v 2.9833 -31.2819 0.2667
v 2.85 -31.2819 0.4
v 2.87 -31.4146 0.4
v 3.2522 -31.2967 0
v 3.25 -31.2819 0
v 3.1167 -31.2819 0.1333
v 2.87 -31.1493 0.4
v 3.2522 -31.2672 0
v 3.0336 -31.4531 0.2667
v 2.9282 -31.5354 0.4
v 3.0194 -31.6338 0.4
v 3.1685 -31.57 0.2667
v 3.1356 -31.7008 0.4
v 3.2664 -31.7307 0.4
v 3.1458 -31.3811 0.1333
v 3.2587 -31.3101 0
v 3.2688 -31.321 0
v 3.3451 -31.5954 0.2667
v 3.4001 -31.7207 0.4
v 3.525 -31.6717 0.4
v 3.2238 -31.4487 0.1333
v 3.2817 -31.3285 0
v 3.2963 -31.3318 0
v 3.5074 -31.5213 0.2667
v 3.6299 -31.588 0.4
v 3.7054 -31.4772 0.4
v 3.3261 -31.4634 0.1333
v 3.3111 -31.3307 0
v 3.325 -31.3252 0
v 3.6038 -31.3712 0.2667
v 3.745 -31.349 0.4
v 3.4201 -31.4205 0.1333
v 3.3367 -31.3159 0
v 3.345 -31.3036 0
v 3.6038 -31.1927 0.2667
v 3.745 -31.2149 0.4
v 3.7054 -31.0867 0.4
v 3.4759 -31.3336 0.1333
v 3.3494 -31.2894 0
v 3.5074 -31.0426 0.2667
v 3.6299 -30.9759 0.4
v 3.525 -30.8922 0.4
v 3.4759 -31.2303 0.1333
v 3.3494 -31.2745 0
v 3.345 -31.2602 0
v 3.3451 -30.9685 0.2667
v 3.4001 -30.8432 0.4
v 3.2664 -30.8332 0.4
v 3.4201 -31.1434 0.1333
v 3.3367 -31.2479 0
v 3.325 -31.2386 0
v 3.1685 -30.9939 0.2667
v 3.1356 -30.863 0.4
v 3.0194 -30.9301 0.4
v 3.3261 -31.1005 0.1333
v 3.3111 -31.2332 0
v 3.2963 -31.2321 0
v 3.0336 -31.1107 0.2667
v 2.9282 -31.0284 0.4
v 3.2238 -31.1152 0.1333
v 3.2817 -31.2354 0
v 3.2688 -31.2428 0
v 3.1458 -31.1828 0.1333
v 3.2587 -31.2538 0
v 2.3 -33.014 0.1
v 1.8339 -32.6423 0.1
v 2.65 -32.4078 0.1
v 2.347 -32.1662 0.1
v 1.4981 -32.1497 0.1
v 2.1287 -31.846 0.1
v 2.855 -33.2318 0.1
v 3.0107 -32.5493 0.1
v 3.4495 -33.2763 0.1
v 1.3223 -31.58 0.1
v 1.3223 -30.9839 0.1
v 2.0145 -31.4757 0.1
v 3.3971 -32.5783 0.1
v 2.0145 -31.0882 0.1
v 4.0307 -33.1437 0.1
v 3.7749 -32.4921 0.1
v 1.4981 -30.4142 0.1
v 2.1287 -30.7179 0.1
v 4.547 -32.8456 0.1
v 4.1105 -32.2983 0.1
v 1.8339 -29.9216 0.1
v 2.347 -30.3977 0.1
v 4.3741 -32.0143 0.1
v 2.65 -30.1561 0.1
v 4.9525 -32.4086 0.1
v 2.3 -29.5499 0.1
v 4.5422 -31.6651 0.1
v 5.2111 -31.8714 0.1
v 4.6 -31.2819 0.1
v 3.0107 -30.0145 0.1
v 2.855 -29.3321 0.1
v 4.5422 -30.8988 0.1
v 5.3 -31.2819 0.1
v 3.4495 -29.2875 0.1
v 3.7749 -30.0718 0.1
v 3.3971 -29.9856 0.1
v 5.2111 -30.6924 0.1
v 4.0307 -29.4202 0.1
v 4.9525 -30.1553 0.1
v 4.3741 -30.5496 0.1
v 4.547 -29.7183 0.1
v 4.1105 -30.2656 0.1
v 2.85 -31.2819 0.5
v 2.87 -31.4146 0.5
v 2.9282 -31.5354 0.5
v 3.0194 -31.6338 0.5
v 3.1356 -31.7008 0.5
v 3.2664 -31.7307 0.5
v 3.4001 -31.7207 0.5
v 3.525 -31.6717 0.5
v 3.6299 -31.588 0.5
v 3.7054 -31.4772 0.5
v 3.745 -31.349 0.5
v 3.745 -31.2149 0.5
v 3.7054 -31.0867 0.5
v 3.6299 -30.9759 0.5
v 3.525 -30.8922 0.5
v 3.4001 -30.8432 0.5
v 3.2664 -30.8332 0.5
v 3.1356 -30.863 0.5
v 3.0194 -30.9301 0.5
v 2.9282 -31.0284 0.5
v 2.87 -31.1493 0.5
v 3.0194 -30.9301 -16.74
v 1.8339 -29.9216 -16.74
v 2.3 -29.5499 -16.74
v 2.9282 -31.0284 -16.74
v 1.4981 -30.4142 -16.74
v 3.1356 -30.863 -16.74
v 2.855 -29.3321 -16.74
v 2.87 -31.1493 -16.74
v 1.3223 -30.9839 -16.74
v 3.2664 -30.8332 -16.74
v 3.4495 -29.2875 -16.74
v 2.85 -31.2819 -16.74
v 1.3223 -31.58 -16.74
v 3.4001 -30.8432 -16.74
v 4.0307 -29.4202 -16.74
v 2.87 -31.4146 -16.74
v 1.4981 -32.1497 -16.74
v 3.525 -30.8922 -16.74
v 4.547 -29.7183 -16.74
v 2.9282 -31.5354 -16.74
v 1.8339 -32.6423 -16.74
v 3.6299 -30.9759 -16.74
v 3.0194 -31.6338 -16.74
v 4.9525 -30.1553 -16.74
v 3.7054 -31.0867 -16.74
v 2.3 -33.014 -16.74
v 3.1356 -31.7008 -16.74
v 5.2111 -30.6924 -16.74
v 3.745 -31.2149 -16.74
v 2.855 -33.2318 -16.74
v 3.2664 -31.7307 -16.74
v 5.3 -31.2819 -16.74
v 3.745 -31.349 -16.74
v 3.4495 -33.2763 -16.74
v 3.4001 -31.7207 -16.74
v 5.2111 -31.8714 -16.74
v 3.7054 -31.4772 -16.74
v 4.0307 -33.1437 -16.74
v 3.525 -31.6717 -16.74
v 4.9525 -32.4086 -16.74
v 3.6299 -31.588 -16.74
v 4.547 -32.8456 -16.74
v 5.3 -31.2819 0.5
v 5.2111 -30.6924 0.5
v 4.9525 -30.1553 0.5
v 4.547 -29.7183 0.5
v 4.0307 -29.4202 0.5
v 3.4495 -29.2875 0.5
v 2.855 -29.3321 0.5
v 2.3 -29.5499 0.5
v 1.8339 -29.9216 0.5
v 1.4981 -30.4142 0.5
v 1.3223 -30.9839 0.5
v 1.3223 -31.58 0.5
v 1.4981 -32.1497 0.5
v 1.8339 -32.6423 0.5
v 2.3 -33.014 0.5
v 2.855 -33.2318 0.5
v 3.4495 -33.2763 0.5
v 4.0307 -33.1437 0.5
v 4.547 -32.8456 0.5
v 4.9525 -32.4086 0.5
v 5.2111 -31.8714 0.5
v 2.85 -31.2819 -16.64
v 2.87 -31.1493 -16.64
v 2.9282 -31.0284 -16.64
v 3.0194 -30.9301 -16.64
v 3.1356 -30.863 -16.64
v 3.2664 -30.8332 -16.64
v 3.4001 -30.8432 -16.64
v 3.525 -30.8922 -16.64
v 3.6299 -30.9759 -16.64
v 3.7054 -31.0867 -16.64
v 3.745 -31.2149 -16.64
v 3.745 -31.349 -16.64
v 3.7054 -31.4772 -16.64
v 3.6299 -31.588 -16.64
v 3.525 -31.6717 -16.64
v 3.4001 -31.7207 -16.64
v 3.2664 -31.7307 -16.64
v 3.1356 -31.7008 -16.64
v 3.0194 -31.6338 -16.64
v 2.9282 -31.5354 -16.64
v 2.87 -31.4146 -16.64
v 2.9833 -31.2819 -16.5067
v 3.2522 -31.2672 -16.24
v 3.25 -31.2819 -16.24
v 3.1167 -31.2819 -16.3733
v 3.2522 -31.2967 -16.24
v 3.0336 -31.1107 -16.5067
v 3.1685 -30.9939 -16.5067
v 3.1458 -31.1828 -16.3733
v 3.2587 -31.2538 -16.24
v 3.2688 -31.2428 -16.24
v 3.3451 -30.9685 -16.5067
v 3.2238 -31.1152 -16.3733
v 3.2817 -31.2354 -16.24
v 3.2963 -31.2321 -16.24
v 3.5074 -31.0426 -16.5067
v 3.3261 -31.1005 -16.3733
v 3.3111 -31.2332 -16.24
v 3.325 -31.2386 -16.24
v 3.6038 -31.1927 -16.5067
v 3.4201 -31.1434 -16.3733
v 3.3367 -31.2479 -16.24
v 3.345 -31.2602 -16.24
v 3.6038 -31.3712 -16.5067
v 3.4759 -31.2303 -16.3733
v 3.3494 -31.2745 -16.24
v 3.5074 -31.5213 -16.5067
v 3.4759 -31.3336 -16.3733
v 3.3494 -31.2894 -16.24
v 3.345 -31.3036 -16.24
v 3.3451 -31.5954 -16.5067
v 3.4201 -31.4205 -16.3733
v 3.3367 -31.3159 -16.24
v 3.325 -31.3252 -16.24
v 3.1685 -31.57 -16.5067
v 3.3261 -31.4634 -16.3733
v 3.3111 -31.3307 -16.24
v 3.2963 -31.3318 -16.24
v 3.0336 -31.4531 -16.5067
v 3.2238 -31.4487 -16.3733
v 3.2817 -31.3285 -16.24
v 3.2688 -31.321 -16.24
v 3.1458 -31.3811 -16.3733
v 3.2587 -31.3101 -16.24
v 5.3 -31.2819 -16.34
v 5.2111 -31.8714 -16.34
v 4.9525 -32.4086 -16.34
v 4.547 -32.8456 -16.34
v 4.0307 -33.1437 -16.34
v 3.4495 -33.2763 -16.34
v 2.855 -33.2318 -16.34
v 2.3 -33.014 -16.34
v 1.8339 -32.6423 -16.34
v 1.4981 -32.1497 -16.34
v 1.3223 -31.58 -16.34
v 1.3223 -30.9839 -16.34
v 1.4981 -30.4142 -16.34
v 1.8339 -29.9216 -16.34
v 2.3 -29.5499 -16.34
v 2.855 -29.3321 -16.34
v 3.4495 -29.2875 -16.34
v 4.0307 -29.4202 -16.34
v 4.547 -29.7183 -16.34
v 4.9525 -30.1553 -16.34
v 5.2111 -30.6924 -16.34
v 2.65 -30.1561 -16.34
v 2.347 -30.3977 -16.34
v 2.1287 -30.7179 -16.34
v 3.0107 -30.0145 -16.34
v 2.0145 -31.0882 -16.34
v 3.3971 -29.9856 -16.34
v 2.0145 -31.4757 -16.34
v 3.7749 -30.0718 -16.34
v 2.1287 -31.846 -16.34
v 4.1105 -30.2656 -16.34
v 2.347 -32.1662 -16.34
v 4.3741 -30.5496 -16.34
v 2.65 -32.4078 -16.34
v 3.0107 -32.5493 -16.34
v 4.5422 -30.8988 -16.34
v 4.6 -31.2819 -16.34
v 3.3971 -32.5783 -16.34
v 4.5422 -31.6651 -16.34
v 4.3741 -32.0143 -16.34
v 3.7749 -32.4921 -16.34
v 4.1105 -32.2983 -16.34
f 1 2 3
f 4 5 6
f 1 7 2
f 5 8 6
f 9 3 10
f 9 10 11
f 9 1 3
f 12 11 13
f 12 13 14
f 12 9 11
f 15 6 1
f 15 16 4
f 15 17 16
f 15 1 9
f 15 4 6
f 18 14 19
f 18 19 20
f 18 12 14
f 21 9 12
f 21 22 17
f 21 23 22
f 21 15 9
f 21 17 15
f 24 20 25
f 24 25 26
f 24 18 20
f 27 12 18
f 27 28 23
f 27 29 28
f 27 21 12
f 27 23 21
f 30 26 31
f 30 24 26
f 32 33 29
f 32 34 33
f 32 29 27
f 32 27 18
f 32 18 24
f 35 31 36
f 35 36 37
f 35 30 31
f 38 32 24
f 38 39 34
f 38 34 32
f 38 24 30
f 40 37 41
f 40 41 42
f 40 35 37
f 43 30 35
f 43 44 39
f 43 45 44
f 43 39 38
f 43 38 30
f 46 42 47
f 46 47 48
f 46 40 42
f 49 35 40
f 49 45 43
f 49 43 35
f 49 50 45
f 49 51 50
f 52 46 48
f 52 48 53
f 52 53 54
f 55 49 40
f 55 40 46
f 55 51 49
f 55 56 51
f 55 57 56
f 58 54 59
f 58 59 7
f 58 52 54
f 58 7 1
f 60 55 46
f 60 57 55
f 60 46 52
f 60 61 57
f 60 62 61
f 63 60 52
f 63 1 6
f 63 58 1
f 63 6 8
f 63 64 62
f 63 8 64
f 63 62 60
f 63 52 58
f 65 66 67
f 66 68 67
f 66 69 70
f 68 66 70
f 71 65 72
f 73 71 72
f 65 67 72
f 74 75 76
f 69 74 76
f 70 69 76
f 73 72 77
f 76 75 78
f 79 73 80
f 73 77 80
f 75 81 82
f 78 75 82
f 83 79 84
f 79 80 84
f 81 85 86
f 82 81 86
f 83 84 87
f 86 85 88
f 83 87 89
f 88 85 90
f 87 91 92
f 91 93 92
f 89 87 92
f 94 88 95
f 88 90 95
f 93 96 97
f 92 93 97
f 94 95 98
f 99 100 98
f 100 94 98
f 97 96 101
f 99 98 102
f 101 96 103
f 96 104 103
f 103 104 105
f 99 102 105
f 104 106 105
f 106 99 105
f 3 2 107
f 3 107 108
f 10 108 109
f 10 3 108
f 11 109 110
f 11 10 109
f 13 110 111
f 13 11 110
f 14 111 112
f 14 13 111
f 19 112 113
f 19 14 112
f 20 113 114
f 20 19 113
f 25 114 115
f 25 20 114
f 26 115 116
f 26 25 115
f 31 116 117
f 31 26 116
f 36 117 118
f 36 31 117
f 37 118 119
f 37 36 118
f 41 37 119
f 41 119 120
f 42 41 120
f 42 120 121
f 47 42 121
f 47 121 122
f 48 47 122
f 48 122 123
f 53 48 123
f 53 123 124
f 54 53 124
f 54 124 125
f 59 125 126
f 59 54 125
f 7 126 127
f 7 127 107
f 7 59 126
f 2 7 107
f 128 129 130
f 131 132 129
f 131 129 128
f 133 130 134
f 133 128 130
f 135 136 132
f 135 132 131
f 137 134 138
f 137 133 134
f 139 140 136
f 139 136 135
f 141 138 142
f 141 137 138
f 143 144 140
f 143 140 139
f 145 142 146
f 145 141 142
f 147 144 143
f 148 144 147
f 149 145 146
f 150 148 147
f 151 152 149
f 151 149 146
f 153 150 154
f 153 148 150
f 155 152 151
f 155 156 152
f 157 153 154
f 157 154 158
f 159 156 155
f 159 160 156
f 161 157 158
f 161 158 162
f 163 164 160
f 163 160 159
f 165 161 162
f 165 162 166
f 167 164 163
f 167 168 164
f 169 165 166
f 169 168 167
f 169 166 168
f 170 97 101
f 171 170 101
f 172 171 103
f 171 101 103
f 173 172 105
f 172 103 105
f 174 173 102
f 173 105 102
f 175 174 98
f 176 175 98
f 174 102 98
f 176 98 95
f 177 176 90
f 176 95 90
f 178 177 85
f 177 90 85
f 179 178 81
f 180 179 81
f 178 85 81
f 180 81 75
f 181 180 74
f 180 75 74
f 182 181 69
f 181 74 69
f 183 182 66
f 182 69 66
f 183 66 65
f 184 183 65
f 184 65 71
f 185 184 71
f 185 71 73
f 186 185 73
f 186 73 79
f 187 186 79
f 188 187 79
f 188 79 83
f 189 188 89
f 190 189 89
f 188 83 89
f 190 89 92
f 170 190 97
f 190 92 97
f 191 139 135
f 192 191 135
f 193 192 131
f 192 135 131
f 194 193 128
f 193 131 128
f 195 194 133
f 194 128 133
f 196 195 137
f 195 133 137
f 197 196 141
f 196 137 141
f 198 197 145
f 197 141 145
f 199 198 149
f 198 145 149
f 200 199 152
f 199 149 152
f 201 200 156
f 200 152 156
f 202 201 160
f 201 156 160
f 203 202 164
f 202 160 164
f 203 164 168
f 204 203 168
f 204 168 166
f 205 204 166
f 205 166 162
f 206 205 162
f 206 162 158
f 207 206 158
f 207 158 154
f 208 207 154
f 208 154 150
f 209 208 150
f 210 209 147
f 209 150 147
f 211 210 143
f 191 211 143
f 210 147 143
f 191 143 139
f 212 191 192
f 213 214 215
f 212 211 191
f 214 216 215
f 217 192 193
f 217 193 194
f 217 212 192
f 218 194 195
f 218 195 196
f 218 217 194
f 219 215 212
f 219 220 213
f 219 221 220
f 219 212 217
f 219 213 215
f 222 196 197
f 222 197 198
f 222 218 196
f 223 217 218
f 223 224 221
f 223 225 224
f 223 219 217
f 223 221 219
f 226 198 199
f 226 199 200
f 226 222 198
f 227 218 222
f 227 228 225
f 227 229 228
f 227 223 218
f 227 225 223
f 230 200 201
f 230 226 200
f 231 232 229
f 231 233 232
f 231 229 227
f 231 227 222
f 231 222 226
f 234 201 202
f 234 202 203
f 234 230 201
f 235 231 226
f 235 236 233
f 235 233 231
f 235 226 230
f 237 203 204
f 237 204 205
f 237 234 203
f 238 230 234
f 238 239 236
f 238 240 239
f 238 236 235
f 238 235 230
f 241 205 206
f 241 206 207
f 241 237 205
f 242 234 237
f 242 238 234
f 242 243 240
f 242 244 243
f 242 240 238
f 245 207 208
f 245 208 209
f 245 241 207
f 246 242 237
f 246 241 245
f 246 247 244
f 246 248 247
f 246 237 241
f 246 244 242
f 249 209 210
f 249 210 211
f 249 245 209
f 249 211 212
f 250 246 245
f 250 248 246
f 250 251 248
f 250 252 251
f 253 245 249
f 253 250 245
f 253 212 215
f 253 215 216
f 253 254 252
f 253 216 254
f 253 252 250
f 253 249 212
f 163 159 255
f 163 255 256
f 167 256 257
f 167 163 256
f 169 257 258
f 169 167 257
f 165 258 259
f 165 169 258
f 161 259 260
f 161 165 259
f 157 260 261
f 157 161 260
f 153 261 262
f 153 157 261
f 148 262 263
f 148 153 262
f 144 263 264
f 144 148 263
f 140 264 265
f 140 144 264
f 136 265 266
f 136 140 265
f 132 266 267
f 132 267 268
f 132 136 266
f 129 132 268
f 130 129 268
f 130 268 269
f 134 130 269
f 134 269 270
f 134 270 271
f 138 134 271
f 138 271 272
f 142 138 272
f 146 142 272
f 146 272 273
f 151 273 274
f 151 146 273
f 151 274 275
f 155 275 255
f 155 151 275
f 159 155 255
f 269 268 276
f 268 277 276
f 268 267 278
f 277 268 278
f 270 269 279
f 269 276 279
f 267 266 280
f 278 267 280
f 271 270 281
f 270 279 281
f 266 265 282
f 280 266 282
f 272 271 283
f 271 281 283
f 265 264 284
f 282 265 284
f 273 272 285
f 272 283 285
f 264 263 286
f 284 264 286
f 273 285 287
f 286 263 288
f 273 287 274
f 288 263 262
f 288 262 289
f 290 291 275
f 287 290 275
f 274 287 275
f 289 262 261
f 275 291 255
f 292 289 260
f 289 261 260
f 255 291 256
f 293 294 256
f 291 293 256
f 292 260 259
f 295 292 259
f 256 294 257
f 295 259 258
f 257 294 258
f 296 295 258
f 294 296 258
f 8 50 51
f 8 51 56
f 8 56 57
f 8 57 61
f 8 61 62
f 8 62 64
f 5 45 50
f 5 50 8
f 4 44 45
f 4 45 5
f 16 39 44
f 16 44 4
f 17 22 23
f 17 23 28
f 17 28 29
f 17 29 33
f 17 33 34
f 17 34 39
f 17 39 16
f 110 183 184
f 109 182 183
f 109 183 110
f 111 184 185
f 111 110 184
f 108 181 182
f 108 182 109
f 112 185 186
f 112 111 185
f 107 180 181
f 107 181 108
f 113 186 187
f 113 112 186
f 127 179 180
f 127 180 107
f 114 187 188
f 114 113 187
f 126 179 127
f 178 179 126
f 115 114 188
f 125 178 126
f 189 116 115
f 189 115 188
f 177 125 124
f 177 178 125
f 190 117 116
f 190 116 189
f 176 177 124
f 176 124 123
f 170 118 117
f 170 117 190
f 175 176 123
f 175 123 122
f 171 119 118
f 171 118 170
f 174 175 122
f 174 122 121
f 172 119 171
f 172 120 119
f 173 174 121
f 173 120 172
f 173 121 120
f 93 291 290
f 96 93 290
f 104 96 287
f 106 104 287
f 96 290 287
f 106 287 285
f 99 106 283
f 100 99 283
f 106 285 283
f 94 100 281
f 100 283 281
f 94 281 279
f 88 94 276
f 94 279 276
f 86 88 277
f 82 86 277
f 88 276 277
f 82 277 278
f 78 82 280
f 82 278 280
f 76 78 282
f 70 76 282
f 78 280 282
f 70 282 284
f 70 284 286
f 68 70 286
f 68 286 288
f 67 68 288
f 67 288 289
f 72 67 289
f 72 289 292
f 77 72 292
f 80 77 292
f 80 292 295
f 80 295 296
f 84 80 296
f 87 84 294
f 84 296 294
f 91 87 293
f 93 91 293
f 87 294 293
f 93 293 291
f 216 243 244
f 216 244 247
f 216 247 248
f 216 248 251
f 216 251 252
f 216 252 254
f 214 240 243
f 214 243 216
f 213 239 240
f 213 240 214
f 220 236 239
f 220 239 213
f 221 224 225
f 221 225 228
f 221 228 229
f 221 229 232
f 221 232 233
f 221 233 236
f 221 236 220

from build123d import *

# Parameters (mm, degrees)
Y_KSEKLIK_EKSTR_ZYON1_DEPTH      = 0.1
Y_KSEKLIK_EKSTR_ZYON1_DEPTH_BACK = 16.34
IZIM1_R                          = 1.3
IZIM2_R                          = 2
Y_KSEKLIK_EKSTR_ZYON2_DEPTH      = 0.4
Y_KSEKLIK_EKSTR_ZYON3_START      = 0.4
IZIM3_R                          = 2
Y_KSEKLIK_EKSTR_ZYON3_DEPTH      = 0.4
IZIM4_R                          = 0.45
KES_EKSTR_ZYON1_DEPTH            = 0.5
PAH1_SIZE                        = 0.4
KES_EKSTR_ZYON2_START            = -0.5
IZIM5_R                          = 0.45
KES_EKSTR_ZYON2_DEPTH            = 0.5
PAH2_SIZE                        = 0.4


with BuildPart() as part:
    # Çizim1 → Yükseklik-Ekstrüzyon1 (new, two sides: drawn at the far end of the back side and taken through both)
    with BuildSketch(Plane.XY.offset(-Y_KSEKLIK_EKSTR_ZYON1_DEPTH_BACK)):
        with Locations((3.3, -31.281939442)):
            Circle(IZIM1_R)
    extrude(amount=Y_KSEKLIK_EKSTR_ZYON1_DEPTH + Y_KSEKLIK_EKSTR_ZYON1_DEPTH_BACK)

    # Çizim2 → Yükseklik-Ekstrüzyon2 (add)
    with BuildSketch(Plane.XY.offset(0.1)):
        with Locations((3.3, -31.281939442)):
            Circle(IZIM2_R)
    extrude(amount=Y_KSEKLIK_EKSTR_ZYON2_DEPTH)

    # Çizim3 → Yükseklik-Ekstrüzyon3 (add)
    with BuildSketch(Plane(origin=(0, 0, -16.34), x_dir=(-1, 0, 0), z_dir=(0, 0, -1)).offset(Y_KSEKLIK_EKSTR_ZYON3_START)):
        with Locations(Location((-3.3, -31.281939442, 0), (0, 0, 180))):
            Circle(IZIM3_R)
    extrude(amount=-Y_KSEKLIK_EKSTR_ZYON3_DEPTH)

    # Çizim4 → Kes-Ekstrüzyon1 (cut)
    with BuildSketch(Plane(origin=(0, 0, -16.74), x_dir=(-1, 0, 0), z_dir=(0, 0, -1))):
        with Locations((-3.3, -31.281939442)):
            Circle(IZIM4_R)
    extrude(amount=-KES_EKSTR_ZYON1_DEPTH, mode=Mode.SUBTRACT)

    # Pah1
    pah1_edges = [part.edges().sort_by_distance(p)[0] for p in [
        (3.75, -31.281939442, -16.24),
    ]]
    chamfer(pah1_edges, length=PAH1_SIZE)

    # Çizim5 → Kes-Ekstrüzyon2 (cut)
    with BuildSketch(Plane.XY.offset(0.5).offset(KES_EKSTR_ZYON2_START)):
        with Locations(Location((3.3, -31.281939442, 0), (0, 0, 180))):
            Circle(IZIM5_R)
    extrude(amount=KES_EKSTR_ZYON2_DEPTH, mode=Mode.SUBTRACT)

    # Pah2
    pah2_edges = [part.edges().sort_by_distance(p)[0] for p in [
        (3.75, -31.281939442, 0),
    ]]
    chamfer(pah2_edges, length=PAH2_SIZE)


solid = part.part
